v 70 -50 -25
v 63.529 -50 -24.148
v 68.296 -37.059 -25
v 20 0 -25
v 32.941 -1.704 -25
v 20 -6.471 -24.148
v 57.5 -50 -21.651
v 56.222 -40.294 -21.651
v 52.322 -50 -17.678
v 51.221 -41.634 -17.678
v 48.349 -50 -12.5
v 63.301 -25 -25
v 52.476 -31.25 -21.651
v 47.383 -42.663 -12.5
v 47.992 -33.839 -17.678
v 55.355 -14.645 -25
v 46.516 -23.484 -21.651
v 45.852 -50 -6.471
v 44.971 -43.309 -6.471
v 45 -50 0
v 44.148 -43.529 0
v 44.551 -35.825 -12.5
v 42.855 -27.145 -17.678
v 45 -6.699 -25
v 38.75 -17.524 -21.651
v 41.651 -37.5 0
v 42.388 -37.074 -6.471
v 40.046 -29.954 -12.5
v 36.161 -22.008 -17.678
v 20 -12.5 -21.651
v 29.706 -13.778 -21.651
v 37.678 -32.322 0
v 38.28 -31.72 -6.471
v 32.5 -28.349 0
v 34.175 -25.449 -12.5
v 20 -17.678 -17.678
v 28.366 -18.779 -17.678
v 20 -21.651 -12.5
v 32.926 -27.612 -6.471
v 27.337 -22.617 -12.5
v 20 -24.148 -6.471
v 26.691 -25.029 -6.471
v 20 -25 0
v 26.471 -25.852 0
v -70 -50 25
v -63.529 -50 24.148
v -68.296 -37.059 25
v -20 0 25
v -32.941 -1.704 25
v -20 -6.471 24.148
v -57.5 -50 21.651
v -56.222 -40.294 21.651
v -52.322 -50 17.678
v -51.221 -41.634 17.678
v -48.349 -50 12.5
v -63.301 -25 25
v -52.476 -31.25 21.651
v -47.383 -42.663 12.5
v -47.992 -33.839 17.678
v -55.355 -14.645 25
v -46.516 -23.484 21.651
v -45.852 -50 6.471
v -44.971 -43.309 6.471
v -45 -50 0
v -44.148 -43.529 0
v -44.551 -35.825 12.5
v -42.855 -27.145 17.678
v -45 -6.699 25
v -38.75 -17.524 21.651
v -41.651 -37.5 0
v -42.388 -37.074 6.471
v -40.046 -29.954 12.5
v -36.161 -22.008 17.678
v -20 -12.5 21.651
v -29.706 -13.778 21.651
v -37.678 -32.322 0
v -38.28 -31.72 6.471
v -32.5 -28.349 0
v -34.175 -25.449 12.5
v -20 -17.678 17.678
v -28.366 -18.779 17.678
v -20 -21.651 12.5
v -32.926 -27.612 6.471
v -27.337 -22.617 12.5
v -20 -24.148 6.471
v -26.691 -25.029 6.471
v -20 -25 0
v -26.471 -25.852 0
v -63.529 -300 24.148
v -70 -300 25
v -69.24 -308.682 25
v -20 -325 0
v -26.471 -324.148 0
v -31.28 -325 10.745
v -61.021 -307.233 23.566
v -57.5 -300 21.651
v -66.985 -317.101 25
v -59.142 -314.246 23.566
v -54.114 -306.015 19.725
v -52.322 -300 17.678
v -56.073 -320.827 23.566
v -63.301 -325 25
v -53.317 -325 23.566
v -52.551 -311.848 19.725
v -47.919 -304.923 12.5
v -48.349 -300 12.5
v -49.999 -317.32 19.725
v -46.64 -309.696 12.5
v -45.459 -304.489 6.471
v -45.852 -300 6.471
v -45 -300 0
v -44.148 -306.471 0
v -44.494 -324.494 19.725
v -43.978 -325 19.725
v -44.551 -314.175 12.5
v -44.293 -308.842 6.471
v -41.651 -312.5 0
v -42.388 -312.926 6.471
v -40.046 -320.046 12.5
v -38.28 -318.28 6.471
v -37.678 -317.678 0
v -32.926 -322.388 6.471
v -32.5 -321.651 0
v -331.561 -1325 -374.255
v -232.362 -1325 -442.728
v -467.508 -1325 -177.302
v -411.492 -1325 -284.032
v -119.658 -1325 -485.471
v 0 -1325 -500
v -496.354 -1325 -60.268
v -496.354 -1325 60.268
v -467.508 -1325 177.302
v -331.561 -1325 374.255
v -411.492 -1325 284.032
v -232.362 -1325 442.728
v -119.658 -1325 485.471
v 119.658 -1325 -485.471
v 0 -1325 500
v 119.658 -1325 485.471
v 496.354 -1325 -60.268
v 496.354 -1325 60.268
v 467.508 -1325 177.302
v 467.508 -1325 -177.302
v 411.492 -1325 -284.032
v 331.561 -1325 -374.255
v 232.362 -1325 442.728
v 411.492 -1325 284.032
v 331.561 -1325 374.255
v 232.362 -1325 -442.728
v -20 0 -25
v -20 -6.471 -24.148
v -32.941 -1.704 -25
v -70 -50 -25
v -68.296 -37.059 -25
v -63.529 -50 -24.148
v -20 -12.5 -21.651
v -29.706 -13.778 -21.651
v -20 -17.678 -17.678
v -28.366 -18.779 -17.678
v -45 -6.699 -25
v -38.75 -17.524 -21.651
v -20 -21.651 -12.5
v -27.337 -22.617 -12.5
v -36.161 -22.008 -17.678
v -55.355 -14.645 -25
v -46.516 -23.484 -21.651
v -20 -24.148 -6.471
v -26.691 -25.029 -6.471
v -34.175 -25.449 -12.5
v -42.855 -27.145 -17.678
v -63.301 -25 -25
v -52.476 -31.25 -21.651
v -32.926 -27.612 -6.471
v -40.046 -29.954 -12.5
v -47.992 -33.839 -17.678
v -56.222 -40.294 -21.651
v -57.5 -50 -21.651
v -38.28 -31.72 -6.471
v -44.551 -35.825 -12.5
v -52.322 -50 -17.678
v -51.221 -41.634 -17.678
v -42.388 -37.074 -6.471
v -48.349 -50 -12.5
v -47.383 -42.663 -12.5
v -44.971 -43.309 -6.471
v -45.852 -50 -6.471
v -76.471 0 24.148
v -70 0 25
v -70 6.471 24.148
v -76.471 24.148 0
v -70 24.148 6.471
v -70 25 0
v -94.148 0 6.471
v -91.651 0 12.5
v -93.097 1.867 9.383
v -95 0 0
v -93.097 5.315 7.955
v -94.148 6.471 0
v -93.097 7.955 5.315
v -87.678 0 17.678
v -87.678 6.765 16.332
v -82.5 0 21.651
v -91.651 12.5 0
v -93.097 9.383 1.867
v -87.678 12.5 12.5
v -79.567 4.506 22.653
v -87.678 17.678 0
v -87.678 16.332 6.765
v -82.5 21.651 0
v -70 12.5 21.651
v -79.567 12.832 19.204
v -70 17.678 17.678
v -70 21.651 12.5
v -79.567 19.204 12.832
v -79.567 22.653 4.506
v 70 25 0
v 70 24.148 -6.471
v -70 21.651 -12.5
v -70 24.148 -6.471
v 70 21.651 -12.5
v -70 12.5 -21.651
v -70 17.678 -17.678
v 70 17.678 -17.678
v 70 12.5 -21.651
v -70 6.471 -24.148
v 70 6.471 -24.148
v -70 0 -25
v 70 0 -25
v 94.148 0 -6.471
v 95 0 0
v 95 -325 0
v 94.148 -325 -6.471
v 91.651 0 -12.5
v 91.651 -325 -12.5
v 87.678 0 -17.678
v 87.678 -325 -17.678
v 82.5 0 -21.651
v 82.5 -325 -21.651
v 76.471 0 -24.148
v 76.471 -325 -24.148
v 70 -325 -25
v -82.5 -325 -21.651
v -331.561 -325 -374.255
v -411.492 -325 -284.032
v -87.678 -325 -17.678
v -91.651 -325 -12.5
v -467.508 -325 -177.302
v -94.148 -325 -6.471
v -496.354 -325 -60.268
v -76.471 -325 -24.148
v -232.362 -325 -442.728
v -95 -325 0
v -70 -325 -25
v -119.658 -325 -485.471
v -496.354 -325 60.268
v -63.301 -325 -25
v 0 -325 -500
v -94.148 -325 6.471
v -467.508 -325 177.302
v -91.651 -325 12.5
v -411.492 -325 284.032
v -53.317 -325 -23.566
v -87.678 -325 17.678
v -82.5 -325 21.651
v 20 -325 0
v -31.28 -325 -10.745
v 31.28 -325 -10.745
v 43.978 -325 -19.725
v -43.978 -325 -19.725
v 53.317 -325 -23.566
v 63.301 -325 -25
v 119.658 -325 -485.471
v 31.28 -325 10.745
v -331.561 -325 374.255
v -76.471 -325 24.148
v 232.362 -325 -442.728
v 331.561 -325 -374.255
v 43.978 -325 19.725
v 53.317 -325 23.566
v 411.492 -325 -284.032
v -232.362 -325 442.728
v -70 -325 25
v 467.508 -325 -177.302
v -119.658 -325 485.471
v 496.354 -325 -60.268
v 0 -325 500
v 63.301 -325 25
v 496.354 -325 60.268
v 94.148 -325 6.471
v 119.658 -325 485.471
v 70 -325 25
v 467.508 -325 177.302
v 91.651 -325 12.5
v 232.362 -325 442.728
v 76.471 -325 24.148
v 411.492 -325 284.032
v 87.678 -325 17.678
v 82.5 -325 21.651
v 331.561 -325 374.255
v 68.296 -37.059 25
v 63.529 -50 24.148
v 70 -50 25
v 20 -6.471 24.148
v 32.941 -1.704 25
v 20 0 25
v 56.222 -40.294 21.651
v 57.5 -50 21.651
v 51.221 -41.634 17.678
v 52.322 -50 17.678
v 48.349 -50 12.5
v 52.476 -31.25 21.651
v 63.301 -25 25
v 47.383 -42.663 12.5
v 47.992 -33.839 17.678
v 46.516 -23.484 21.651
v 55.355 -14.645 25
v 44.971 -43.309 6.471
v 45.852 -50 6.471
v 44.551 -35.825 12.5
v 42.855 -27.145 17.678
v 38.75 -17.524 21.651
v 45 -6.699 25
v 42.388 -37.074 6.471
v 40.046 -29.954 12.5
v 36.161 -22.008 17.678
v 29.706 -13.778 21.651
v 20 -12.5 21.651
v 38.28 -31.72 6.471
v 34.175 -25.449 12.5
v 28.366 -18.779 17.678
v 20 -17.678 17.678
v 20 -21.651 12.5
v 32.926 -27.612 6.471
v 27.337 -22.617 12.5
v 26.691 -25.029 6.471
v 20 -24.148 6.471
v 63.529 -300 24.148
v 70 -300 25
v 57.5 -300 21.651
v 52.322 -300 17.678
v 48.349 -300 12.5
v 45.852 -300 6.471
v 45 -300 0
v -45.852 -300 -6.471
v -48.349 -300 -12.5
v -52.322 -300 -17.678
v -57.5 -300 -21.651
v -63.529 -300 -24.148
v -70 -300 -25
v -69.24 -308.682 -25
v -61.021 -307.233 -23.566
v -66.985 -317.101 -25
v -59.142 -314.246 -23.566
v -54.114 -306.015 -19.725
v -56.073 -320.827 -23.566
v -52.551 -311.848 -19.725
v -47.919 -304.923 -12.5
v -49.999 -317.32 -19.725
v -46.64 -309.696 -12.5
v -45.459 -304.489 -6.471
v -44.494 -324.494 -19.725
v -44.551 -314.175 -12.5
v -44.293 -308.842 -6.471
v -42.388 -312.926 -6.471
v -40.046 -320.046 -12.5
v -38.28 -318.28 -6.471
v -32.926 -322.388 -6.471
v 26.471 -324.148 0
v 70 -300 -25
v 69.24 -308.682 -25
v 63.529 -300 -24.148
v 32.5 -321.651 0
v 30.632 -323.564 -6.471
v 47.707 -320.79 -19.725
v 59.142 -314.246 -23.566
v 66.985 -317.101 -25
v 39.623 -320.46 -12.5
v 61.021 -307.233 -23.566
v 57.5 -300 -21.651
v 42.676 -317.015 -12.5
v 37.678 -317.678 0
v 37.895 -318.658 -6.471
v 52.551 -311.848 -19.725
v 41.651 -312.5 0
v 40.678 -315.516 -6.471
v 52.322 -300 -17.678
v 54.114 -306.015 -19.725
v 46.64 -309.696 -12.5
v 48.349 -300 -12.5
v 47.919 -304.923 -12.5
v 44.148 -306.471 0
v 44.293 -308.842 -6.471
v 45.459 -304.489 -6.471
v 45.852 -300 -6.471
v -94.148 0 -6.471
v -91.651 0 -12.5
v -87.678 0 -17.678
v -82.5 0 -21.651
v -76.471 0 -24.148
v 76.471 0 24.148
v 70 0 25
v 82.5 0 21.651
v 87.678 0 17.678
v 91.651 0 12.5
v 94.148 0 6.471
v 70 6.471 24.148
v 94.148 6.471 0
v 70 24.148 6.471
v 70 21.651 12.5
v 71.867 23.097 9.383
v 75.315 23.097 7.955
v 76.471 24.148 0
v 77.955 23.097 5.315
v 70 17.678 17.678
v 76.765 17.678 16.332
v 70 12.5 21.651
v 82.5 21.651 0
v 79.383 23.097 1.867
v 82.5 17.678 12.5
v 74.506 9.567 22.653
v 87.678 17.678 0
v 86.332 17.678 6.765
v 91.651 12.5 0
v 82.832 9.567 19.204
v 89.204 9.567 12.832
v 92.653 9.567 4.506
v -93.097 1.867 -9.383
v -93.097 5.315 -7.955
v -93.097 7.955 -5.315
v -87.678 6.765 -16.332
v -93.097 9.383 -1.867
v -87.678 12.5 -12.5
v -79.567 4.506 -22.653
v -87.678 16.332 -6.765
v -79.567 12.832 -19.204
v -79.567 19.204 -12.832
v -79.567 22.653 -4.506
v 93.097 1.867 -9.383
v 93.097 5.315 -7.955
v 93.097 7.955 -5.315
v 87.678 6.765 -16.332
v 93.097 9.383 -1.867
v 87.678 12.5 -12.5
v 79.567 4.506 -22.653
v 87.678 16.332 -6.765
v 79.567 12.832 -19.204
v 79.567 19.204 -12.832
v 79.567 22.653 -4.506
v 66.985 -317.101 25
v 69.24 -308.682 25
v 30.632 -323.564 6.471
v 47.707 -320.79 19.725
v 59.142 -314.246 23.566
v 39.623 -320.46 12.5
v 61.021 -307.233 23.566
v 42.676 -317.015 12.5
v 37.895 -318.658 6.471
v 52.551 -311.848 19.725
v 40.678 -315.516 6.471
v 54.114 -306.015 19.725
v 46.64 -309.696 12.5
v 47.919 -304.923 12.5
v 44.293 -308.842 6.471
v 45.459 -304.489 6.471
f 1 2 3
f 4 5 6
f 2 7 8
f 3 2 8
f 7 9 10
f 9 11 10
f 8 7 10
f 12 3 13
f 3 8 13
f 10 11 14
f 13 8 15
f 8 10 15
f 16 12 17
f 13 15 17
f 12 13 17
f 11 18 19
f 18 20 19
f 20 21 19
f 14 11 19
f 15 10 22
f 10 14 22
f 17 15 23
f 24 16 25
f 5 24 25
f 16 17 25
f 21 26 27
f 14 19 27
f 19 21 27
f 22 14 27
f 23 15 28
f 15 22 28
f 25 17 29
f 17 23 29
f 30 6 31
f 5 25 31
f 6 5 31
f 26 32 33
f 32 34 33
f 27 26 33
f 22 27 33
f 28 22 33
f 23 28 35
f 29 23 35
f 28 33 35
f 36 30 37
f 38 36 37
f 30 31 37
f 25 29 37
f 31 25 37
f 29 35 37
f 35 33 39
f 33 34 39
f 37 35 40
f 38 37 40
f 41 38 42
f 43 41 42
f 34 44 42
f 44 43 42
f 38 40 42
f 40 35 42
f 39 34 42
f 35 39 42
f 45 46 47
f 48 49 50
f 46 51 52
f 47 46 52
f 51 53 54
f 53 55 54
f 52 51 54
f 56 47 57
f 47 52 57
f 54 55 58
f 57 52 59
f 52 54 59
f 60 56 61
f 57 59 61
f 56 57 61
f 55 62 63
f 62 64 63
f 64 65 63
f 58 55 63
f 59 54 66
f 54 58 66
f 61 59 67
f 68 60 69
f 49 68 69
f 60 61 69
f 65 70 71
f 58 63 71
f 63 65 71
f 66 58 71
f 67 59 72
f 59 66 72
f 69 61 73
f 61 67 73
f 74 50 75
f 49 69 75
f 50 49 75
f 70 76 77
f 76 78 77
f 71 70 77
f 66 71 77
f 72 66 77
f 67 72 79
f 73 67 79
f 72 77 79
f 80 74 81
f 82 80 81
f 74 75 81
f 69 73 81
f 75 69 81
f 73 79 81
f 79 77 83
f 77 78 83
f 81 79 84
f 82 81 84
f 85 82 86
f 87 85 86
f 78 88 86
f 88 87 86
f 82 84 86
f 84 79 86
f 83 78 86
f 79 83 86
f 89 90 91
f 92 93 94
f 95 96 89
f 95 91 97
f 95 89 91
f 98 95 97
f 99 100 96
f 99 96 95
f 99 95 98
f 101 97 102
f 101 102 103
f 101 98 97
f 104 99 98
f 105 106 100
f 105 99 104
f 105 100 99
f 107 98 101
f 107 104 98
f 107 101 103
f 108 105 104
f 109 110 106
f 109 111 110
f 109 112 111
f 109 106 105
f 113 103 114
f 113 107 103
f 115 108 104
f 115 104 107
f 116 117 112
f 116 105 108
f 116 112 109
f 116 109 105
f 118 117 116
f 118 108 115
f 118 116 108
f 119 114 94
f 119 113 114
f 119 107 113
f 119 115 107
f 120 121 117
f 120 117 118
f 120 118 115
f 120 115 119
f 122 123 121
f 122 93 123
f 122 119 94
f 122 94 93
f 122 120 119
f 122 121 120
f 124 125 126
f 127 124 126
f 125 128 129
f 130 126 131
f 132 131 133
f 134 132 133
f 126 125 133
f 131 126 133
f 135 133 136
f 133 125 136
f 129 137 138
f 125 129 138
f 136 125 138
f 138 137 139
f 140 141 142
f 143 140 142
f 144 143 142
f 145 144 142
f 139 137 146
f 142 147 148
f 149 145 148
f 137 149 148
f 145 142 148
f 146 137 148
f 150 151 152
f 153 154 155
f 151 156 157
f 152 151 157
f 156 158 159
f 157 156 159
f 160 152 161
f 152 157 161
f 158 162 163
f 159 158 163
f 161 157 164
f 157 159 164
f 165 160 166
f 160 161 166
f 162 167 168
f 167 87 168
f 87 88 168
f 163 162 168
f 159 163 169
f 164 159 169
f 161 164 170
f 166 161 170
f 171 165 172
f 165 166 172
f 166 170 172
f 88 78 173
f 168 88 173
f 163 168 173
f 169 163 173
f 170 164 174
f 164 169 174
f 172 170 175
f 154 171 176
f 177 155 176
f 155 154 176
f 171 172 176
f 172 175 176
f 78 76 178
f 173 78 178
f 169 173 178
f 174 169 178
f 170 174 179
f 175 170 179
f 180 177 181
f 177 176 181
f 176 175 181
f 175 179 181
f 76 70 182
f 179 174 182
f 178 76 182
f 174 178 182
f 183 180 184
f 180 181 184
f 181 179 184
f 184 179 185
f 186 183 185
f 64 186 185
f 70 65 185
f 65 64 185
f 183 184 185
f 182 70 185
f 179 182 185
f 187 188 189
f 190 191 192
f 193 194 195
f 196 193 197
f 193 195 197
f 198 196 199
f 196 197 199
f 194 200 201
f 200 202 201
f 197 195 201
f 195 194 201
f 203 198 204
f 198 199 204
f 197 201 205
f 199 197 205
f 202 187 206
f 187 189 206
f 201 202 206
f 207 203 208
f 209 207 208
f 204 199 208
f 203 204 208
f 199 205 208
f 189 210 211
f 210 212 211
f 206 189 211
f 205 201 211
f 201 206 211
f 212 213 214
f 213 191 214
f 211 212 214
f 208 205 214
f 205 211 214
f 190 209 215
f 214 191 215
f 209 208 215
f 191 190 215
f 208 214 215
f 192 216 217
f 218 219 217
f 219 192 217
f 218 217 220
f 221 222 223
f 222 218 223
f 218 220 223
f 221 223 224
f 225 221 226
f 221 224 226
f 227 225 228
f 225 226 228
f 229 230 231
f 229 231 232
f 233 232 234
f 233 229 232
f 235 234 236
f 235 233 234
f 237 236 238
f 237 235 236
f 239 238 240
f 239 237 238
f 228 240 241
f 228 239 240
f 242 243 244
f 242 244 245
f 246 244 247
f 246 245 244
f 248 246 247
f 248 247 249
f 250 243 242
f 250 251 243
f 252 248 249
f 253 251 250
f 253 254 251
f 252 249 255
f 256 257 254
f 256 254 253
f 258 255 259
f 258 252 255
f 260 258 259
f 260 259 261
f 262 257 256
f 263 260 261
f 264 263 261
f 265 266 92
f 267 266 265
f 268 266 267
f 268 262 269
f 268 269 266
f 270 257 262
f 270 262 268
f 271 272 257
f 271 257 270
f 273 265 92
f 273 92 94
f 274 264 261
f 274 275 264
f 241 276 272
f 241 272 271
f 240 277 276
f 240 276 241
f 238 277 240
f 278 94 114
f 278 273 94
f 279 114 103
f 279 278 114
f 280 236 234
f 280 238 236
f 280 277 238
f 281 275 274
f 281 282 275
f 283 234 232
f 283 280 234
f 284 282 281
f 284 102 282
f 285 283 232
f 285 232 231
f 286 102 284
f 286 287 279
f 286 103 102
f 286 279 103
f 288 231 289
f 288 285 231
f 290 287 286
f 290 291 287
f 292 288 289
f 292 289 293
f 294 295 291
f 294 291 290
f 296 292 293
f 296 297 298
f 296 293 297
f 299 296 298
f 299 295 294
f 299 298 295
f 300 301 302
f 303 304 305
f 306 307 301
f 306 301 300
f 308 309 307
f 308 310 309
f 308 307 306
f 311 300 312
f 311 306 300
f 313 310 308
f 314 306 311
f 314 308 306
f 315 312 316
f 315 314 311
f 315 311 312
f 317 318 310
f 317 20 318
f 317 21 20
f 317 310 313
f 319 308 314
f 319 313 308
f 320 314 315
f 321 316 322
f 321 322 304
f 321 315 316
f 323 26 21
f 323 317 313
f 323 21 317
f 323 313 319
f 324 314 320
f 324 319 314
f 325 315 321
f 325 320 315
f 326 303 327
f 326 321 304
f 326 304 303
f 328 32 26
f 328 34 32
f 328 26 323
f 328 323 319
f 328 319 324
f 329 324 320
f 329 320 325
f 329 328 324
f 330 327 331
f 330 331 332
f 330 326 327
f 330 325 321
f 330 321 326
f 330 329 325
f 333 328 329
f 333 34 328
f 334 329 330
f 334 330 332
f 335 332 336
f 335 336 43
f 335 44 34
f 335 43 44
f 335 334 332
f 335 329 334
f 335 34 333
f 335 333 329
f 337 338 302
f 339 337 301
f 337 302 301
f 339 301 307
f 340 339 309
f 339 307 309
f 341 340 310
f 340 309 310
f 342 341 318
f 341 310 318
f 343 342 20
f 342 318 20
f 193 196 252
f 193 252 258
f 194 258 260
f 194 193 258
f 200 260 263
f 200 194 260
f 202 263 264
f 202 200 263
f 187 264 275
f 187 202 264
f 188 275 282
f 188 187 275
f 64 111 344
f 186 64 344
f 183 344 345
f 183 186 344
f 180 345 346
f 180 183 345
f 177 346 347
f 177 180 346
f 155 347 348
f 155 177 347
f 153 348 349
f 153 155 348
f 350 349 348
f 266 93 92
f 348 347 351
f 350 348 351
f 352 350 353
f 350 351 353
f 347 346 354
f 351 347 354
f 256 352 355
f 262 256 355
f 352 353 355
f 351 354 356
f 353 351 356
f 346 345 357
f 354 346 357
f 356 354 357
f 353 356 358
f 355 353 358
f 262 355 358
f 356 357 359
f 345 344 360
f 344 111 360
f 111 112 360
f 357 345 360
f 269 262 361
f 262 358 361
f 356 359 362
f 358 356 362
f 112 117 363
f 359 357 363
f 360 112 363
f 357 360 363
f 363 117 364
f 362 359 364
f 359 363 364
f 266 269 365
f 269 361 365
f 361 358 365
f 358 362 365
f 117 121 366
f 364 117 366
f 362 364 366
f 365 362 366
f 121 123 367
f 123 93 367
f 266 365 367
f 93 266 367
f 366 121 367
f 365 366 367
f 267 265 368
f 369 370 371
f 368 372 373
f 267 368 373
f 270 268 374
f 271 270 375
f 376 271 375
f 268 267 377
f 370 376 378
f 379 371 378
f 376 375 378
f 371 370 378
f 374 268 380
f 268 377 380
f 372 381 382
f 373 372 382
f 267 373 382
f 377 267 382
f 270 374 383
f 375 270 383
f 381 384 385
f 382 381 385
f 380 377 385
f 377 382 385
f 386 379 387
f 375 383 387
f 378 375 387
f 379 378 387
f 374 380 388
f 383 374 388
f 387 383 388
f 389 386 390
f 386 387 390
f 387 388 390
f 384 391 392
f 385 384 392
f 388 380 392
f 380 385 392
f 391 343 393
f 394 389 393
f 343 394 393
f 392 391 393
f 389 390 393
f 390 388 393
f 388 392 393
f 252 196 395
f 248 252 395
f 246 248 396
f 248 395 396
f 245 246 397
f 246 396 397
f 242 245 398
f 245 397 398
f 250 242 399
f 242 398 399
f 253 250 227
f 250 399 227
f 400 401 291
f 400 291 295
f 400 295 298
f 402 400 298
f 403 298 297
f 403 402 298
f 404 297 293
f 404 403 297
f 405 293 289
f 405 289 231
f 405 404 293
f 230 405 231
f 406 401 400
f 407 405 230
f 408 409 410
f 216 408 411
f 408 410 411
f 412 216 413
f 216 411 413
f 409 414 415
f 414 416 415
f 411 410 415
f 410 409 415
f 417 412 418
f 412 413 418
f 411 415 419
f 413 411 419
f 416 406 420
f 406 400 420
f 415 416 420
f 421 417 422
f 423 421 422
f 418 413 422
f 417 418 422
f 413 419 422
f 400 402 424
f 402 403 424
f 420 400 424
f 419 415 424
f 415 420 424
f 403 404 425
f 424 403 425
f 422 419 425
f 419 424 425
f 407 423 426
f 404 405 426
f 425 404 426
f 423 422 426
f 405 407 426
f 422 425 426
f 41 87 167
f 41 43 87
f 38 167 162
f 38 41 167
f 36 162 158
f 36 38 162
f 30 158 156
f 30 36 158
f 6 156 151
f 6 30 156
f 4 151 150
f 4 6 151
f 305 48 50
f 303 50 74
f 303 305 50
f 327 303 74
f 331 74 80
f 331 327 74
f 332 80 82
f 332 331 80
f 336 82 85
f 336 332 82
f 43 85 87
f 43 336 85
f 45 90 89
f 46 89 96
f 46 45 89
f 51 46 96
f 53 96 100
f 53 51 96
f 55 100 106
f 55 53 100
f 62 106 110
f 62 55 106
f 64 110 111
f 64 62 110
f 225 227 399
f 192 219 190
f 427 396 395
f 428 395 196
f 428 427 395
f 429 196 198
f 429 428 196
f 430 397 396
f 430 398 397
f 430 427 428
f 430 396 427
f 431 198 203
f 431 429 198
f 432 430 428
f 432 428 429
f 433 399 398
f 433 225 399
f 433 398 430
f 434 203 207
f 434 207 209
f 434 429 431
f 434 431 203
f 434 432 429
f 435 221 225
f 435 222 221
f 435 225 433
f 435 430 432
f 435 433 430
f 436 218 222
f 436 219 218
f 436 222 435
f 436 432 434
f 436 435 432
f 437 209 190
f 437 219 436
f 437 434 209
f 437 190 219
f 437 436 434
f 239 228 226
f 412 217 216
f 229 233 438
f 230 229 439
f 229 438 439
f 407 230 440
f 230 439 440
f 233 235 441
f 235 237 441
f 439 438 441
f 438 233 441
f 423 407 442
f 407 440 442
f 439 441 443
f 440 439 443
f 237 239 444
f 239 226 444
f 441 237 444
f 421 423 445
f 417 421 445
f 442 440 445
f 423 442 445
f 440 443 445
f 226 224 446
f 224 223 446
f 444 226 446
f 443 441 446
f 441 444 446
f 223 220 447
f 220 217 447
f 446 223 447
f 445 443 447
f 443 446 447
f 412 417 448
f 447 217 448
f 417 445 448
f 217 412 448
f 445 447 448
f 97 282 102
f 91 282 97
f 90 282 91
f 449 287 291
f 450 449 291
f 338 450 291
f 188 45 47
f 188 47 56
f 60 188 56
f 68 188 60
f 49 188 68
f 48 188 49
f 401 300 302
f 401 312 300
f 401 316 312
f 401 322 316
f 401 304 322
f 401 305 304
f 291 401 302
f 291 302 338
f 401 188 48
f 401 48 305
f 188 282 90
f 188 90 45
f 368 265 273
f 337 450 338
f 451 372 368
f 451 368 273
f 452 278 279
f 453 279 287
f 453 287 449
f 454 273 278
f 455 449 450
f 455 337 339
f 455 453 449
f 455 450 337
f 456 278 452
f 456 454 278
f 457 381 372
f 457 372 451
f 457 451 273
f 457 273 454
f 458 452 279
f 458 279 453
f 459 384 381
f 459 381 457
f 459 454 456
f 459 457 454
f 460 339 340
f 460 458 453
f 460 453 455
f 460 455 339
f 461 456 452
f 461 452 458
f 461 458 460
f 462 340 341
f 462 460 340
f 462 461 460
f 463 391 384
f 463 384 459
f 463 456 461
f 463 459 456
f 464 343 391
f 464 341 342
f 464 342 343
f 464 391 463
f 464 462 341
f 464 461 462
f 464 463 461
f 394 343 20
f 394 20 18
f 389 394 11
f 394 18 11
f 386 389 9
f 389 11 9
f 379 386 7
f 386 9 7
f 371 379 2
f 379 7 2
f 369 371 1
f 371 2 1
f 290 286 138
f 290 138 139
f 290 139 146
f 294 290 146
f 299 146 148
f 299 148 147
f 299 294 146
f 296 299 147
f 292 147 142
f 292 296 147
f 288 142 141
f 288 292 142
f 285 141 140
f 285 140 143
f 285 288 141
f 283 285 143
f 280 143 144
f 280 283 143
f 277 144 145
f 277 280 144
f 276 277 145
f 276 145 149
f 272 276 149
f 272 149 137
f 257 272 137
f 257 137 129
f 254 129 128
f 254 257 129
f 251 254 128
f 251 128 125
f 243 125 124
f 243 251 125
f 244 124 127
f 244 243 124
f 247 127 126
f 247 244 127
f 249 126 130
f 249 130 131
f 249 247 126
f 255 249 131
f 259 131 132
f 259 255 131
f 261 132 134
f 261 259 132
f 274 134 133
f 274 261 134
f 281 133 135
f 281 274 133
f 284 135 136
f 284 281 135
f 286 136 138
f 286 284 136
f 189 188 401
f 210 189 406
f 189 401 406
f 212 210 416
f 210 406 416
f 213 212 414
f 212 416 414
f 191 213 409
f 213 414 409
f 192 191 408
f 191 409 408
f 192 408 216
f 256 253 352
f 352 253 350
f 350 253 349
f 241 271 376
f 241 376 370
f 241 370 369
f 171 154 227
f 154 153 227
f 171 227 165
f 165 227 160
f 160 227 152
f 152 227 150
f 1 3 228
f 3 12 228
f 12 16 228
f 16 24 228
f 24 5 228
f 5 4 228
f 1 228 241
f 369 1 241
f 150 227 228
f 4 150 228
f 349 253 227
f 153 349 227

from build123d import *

# Parameters (mm, degrees)
SKETCH1_W           = 190
SKETCH1_H           = 400
SKETCH1_W_2         = 90
SKETCH1_H_2         = 300
BOSS_EXTRUDE1_DEPTH = 25
FILLET1_R           = 25
SKETCH2_R           = 500
BOSS_EXTRUDE2_DEPTH = 1000


with BuildPart() as part:
    # Sketch1 → Boss-Extrude1 (new, symmetric)
    with BuildSketch(Plane.XY):
        with Locations((0, -175)):
            Rectangle(SKETCH1_W, SKETCH1_H)
        with Locations((0, -175)):
            Rectangle(SKETCH1_W_2, SKETCH1_H_2, mode=Mode.SUBTRACT)
    extrude(amount=BOSS_EXTRUDE1_DEPTH, both=True)

    # Fillet1
    fillet1_edges = [part.edges().sort_by_distance(p)[0] for p in [
        (95, -175, 25),
        (0, 25, 25),
        (-45, -175, -25),
        (-45, -25, 0),
        (0, -325, -25),
        (-45, -325, 0),
        (45, -175, -25),
        (45, -325, 0),
        (0, -25, -25),
        (45, -25, 0),
        (-45, -175, 25),
        (0, -325, 25),
        (45, -175, 25),
        (0, -25, 25),
        (-95, -175, 25),
        (0, 25, -25),
        (95, -175, -25),
        (0, -375, -25),
        (-95, -175, -25),
        (0, -375, 25),
        (-95, 25, 0),
        (95, 25, 0),
        (95, -375, 0),
        (-95, -375, 0),
    ]]
    fillet(fillet1_edges, radius=FILLET1_R - 0.0001)  # a hair under: the kernel refuses the full size

    # Sketch2 → Boss-Extrude2 (add)
    with BuildSketch(Plane(origin=(0, -325, 0), x_dir=(1, 0, 0), z_dir=(0, 1, 0))):
        with Locations(Location((0, 0, 0), (0, 0, 270))):
            Circle(SKETCH2_R)
    extrude(amount=-BOSS_EXTRUDE2_DEPTH)


solid = part.part
